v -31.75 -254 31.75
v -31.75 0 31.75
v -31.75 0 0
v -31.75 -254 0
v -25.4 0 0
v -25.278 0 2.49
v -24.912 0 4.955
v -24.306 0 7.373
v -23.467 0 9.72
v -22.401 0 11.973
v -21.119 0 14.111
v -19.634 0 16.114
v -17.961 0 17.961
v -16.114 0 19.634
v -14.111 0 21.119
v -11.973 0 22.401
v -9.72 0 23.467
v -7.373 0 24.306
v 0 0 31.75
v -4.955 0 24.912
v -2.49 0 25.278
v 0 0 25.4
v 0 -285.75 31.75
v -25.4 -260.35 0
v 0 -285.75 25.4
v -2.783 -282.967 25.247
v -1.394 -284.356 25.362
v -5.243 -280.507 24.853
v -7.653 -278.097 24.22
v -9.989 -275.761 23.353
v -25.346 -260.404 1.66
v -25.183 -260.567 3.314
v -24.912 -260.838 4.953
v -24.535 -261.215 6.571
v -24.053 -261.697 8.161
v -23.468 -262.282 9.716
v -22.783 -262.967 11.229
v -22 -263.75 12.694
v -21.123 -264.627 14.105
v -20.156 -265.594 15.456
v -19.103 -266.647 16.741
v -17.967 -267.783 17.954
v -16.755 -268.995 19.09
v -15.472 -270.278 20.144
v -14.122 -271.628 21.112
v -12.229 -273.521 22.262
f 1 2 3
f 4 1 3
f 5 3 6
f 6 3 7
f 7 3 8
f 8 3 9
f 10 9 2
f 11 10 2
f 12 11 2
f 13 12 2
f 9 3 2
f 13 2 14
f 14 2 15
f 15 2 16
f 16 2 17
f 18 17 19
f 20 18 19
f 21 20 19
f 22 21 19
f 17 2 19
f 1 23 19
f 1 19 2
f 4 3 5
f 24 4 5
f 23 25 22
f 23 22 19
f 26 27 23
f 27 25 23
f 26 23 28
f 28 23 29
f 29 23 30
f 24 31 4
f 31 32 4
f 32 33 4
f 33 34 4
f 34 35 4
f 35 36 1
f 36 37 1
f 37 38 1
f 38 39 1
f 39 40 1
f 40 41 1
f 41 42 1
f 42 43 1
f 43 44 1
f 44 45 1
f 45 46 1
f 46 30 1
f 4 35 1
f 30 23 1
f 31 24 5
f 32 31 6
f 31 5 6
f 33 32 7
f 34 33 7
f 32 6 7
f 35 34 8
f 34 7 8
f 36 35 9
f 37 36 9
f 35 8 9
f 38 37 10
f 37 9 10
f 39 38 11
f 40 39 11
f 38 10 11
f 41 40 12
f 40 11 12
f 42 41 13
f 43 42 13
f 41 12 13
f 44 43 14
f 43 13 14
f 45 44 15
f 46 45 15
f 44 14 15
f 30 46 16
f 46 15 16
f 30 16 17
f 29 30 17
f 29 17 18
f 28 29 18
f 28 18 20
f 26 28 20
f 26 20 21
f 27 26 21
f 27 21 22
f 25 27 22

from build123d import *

# Parameters (mm, degrees)
F1_DEPTH = 285.75
F3_DEPTH = 50.8


with BuildPart() as f1:
    # F0 (on Front) → F1 (new body)
    with BuildSketch(Plane.XZ):
        with BuildLine():
            Line((-31.75, 0), (-25.4, 0))
            ThreePointArc((-25.4, 0), (-17.960512, 17.960512), (0, 25.4))
            Line((0, 25.4), (0, 31.75))
            Line((0, 31.75), (-31.75, 31.75))
            Line((-31.75, 31.75), (-31.75, 0))
        make_face()
    extrude(amount=F1_DEPTH)

    # F2 (on face) → F3 (cut)
    with BuildSketch(Plane.XY.offset(31.75)):
        Polygon((-31.75, -285.75), (0, -285.75), (-31.75, -254), align=None)
    extrude(amount=-F3_DEPTH, mode=Mode.SUBTRACT)


solid = f1.part
